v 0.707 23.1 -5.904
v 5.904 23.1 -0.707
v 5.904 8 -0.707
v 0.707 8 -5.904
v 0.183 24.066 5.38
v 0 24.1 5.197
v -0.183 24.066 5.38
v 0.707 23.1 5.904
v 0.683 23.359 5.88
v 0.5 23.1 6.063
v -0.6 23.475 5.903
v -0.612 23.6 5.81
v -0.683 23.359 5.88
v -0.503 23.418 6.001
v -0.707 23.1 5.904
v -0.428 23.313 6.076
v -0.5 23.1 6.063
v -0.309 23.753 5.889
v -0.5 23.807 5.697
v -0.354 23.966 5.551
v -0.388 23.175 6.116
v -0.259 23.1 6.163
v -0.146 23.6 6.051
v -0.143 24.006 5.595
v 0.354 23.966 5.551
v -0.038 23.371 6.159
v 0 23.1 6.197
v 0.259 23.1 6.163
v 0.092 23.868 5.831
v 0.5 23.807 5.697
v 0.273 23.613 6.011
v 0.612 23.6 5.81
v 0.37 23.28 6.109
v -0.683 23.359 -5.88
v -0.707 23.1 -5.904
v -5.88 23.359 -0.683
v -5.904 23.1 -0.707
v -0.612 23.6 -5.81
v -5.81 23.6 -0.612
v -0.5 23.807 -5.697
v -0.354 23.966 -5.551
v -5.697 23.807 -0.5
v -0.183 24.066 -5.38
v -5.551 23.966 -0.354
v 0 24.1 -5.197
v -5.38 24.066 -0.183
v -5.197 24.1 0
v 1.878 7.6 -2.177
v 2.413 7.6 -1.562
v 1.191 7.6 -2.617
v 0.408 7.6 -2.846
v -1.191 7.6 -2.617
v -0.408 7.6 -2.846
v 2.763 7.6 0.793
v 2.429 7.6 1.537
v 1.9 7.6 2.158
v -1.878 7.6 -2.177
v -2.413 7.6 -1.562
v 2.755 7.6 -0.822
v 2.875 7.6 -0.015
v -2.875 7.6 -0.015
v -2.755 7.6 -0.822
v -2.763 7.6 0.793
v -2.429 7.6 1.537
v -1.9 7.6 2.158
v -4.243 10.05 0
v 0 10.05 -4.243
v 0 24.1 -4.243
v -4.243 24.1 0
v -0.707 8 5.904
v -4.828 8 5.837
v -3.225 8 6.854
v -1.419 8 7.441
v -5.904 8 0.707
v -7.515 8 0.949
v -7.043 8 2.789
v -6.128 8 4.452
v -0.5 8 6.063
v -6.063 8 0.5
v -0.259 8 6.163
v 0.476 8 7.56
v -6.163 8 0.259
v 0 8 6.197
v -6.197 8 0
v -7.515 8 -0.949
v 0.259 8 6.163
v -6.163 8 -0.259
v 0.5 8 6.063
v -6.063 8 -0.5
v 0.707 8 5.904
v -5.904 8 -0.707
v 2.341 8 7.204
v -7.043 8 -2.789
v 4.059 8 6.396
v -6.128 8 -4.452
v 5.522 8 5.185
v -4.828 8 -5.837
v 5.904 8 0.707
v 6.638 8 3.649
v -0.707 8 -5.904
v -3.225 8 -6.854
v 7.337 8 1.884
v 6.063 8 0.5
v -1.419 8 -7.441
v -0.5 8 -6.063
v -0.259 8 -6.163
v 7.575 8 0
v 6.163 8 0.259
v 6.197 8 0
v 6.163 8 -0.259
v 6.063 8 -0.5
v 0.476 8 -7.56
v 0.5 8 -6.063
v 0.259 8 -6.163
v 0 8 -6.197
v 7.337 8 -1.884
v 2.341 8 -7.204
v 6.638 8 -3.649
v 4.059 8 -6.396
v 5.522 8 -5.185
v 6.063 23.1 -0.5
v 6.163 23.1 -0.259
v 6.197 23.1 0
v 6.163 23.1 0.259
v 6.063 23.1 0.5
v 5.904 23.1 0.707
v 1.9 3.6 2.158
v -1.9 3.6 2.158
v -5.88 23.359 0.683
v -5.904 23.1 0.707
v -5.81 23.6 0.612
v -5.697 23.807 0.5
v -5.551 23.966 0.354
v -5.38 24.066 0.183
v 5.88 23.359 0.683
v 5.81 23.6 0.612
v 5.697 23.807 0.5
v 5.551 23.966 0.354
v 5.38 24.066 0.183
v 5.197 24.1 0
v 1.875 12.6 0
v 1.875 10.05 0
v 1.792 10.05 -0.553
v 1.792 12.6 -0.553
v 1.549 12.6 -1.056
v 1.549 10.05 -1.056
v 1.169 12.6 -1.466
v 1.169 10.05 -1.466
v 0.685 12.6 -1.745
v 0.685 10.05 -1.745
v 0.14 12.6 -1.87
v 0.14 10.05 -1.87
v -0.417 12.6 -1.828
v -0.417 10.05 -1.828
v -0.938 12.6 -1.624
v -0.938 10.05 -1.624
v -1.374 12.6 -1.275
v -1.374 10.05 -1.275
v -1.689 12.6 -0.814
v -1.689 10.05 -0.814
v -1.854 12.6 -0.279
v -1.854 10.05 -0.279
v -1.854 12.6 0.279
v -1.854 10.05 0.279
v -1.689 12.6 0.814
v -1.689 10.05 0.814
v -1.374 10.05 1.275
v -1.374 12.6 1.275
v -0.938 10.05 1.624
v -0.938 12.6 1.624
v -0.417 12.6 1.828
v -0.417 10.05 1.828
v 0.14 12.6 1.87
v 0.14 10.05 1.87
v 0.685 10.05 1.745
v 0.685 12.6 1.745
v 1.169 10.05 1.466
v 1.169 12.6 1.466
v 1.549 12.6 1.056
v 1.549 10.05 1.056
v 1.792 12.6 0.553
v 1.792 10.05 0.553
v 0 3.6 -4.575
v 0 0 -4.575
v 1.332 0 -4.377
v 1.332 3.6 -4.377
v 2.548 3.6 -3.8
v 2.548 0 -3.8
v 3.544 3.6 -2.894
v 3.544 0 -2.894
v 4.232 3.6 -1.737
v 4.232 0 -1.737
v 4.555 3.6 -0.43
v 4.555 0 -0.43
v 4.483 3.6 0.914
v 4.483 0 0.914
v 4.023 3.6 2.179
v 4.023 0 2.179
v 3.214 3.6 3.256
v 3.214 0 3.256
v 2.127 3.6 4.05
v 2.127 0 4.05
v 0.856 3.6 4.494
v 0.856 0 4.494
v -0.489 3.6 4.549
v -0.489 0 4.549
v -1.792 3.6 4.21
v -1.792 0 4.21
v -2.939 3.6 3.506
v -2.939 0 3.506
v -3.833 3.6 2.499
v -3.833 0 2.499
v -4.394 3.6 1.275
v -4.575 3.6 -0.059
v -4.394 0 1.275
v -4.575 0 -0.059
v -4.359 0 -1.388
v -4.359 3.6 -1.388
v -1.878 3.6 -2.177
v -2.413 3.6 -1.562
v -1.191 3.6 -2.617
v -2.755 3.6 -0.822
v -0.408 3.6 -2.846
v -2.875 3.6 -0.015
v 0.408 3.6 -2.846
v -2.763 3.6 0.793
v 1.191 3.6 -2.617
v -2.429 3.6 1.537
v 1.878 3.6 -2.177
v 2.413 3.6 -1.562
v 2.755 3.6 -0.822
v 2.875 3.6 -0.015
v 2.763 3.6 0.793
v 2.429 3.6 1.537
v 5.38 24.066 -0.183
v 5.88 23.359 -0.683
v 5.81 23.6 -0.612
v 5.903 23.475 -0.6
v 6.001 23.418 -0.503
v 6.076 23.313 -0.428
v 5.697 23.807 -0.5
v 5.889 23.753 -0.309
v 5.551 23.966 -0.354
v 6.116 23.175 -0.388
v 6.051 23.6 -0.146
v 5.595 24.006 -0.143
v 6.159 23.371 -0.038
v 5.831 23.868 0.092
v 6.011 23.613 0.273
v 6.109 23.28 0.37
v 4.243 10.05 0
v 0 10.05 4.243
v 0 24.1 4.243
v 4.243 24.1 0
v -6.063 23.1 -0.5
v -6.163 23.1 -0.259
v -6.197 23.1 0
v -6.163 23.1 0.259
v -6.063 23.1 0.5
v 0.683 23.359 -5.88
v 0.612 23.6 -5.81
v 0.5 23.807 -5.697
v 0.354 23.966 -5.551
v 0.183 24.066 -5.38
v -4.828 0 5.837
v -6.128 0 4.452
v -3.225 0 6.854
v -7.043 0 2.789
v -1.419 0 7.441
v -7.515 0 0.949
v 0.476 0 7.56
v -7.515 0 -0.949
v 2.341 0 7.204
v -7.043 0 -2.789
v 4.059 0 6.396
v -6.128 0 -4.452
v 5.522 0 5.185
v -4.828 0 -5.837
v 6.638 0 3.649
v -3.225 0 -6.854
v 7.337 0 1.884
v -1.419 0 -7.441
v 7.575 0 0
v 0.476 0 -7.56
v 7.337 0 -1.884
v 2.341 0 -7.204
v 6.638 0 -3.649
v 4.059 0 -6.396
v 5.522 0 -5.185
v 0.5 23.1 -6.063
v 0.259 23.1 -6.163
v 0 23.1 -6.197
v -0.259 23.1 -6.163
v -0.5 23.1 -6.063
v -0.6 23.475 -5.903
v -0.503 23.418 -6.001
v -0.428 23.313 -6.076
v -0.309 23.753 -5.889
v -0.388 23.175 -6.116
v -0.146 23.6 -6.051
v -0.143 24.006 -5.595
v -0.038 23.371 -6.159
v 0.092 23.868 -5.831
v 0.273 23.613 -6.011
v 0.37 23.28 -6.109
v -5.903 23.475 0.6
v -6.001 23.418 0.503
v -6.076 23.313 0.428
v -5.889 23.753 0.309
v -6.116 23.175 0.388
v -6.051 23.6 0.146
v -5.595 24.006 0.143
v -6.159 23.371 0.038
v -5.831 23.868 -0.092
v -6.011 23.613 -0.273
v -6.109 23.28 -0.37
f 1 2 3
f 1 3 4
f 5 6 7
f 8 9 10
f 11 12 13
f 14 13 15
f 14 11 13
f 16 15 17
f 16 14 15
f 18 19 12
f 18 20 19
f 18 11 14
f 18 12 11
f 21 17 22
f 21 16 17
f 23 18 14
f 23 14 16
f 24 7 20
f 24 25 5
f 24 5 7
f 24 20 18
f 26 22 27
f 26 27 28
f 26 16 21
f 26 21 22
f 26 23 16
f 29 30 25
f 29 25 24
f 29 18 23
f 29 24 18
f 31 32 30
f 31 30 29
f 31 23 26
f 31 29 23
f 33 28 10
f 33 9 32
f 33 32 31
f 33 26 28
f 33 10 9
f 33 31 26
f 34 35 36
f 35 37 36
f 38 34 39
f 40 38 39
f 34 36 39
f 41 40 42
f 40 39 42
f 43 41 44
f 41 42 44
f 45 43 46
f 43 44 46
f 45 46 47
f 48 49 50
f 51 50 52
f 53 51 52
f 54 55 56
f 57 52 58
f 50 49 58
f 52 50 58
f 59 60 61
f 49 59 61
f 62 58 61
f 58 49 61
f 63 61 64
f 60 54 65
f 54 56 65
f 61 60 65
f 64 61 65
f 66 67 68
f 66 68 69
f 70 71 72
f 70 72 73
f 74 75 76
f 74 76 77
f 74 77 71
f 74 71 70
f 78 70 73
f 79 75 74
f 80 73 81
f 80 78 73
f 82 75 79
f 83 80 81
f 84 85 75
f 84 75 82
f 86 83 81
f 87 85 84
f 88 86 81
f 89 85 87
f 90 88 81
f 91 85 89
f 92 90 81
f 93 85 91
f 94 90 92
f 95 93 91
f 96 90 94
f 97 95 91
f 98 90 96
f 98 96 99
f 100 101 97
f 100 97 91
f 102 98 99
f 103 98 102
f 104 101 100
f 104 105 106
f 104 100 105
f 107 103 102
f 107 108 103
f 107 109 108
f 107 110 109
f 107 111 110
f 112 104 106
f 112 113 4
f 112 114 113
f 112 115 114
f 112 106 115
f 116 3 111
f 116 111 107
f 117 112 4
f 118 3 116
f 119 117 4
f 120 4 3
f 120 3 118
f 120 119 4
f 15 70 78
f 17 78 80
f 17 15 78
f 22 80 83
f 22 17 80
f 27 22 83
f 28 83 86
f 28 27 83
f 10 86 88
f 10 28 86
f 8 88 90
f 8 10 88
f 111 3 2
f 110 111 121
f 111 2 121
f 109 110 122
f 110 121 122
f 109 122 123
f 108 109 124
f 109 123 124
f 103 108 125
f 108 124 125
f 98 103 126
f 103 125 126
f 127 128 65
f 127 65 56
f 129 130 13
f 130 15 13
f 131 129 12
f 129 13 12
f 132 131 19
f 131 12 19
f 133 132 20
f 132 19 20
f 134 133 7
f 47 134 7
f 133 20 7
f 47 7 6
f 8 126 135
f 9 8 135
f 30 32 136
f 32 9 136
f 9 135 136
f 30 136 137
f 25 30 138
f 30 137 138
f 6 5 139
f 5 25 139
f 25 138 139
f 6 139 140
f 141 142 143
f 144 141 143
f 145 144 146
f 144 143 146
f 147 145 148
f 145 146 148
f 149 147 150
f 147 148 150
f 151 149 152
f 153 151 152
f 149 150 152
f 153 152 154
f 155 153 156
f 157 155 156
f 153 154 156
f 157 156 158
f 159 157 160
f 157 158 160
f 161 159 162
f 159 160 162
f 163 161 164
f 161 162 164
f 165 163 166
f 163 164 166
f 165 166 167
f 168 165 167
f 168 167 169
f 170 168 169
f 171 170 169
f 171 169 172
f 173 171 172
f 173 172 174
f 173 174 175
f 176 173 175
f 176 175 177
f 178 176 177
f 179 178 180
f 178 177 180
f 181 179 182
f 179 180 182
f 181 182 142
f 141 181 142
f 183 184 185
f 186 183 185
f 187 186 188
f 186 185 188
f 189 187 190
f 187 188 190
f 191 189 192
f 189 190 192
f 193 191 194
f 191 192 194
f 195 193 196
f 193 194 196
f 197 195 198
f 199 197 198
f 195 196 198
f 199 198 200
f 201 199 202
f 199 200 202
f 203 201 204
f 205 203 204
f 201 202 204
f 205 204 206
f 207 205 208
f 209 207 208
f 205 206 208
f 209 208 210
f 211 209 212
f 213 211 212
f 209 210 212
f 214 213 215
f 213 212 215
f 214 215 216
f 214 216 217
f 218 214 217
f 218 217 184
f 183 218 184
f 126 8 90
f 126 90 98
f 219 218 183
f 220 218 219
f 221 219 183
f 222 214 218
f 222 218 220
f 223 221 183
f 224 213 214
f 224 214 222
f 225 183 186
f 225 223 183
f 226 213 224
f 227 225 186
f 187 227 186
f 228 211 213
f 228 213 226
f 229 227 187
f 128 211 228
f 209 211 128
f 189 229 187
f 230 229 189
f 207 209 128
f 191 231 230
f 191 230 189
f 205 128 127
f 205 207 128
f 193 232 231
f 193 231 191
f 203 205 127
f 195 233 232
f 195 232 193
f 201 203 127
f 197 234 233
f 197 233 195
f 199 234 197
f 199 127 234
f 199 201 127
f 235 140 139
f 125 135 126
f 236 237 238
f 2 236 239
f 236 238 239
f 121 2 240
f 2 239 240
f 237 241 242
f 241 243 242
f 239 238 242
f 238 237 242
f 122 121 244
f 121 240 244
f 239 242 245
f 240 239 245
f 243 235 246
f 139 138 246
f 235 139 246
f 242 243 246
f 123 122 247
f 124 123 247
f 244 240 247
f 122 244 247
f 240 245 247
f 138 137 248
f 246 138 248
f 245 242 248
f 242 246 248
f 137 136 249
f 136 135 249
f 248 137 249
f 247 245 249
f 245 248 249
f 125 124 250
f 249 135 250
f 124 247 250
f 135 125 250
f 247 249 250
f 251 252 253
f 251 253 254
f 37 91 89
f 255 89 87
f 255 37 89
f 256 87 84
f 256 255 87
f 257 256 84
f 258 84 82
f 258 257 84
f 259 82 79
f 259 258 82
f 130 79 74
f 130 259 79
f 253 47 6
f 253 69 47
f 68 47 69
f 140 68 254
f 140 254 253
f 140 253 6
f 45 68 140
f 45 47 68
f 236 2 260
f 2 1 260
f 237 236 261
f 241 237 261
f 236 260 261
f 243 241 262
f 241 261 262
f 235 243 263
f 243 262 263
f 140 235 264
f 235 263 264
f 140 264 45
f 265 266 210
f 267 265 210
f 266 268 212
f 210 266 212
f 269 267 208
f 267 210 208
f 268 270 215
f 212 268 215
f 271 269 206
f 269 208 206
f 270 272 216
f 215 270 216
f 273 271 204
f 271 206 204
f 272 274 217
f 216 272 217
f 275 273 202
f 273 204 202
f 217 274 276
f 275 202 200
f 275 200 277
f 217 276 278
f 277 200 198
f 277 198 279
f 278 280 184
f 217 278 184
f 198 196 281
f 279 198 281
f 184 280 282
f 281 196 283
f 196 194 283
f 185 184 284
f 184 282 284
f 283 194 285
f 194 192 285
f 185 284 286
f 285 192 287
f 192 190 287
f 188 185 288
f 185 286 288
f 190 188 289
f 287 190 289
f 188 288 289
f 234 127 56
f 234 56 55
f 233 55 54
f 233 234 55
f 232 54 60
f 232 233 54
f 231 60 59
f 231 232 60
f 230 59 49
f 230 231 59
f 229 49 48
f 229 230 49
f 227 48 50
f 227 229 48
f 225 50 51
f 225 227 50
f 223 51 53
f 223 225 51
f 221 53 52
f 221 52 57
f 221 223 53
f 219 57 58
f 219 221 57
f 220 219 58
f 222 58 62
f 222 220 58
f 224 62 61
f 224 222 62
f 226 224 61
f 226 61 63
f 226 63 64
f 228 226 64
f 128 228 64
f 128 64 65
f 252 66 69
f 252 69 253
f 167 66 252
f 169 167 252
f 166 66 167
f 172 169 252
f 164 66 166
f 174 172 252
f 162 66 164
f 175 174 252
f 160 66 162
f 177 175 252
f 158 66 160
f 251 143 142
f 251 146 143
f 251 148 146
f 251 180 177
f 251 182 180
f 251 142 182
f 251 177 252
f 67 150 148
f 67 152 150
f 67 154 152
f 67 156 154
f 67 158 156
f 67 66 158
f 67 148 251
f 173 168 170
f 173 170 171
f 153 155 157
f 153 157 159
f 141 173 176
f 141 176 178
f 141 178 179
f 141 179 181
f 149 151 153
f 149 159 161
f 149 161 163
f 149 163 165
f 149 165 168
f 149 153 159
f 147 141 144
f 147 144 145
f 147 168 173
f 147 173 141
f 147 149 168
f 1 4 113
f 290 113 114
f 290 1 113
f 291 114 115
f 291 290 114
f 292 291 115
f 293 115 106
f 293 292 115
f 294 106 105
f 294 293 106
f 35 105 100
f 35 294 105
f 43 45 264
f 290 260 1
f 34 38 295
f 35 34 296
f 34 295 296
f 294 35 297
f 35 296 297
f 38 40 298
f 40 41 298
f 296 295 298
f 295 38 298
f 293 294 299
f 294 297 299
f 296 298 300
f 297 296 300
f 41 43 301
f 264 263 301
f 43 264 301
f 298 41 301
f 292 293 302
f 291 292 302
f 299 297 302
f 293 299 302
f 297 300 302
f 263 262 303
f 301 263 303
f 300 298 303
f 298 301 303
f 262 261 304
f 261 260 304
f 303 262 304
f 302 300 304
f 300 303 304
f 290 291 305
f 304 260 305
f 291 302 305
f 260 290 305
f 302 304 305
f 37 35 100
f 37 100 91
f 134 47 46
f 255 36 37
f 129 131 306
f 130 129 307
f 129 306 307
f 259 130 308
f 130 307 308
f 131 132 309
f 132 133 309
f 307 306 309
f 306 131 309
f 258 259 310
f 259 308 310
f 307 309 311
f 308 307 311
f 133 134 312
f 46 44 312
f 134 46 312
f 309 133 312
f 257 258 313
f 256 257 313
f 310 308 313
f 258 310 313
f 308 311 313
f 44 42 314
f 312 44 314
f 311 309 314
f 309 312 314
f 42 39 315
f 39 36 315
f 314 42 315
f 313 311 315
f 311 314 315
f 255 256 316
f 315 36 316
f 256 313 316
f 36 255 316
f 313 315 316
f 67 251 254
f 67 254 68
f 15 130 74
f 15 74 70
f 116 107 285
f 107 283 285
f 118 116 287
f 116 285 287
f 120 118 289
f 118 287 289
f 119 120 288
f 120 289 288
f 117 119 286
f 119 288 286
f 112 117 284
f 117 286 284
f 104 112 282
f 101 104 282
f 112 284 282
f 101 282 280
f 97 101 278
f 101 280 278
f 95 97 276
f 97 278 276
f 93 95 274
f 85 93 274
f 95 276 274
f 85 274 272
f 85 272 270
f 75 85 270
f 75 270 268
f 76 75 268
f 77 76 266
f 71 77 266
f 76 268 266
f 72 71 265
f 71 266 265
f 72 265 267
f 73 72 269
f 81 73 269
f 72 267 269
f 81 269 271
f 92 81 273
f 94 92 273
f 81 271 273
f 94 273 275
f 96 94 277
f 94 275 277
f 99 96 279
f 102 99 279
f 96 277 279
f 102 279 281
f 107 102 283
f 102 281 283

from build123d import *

# Parameters (mm, degrees)
SKETCH1_R           = 7.575
BOSS_EXTRUDE1_DEPTH = 5.2
CUT_EXTRUDE1_DEPTH  = 3.6
BOSS_EXTRUDE2_DEPTH = 18.9
FILLET1_R           = 1
BOSS_EXTRUDE3_DEPTH = 4.85
SKETCH6_R           = 1.875
BOSS_EXTRUDE4_DEPTH = 2.55
CUT_EXTRUDE2_DEPTH  = 4
SKETCH7_R           = 7.575
BOSS_EXTRUDE5_DEPTH = 2.8


with BuildPart() as part:
    # Sketch1 → Boss-Extrude1 (new body)
    with BuildSketch(Plane(origin=(0, 0, 0), x_dir=(1, 0, 0), z_dir=(0, 1, 0))):
        Circle(SKETCH1_R)
    extrude(amount=BOSS_EXTRUDE1_DEPTH)

    # Sketch2 → Cut-Extrude1 (cut)
    with BuildSketch(Plane.XZ):
        with BuildLine():
            Line((-4.359330502, -1.388114754), (0, -4.575))
            ThreePointArc((0, -4.575), (2.7, 3.693321676), (-4.359330502, -1.388114754))
        make_face()
    extrude(amount=-CUT_EXTRUDE1_DEPTH, mode=Mode.SUBTRACT)

    # Sketch4 → Boss-Extrude2 (add)
    with BuildSketch(Plane(origin=(0, 5.2, 0), x_dir=(1, 0, 0), z_dir=(0, 1, 0))):
        Polygon((6.611448404, 0), (0, 6.611448404), (-6.611448404, 0), (0, -6.611448404), align=None)
        Polygon((4.242640687, 0), (0, 4.242640687), (-4.242640687, 0), (0, -4.242640687), align=None, mode=Mode.SUBTRACT)
    extrude(amount=BOSS_EXTRUDE2_DEPTH)

    # Fillet1
    fillet1_edges = [part.edges().sort_by_distance(p)[0] for p in [
        (3.305724202, 24.1, 3.305724202),
        (3.305724202, 24.1, -3.305724202),
        (-3.305724202, 24.1, -3.305724202),
        (-3.305724202, 24.1, 3.305724202),
        (0, 14.65, 6.611448404),
        (6.611448404, 14.65, 0),
        (0, 14.65, -6.611448404),
        (-6.611448404, 14.65, 0),
    ]]
    fillet(fillet1_edges, radius=FILLET1_R)

    # Sketch5 → Boss-Extrude3 (add)
    with BuildSketch(Plane(origin=(0, 5.2, 0), x_dir=(1, 0, 0), z_dir=(0, 1, 0))):
        Polygon((0, -4.242640687), (4.242640687, 0), (0, 4.242640687), (-4.242640687, 0), align=None)
    extrude(amount=BOSS_EXTRUDE3_DEPTH)

    # Sketch6 → Boss-Extrude4 (add)
    with BuildSketch(Plane(origin=(0, 10.05, 0), x_dir=(1, 0, 0), z_dir=(0, 1, 0))):
        Circle(SKETCH6_R)
    extrude(amount=BOSS_EXTRUDE4_DEPTH)

    # Sketch3 → Cut-Extrude2 (cut)
    with BuildSketch(Plane.XZ.offset(-3.6)):
        with BuildLine():
            Line((-1.9, 2.157689737), (1.9, 2.157689737))
            ThreePointArc((1.9, 2.157689737), (0, -2.875), (-1.9, 2.157689737))
        make_face()
    extrude(amount=-CUT_EXTRUDE2_DEPTH, mode=Mode.SUBTRACT)

    # Sketch7 → Boss-Extrude5 (add)
    with BuildSketch(Plane(origin=(0, 5.2, 0), x_dir=(1, 0, 0), z_dir=(0, 1, 0))):
        Circle(SKETCH7_R)
        with BuildLine():
            Line((-5.904341623, -0.707106781), (-0.707106781, -5.904341623))
            ThreePointArc((-0.707106781, -5.904341623), (0, -6.197234842), (0.707106781, -5.904341623))
            Line((0.707106781, -5.904341623), (5.904341623, -0.707106781))
            ThreePointArc((5.904341623, -0.707106781), (6.197234842, 0), (5.904341623, 0.707106781))
            Line((5.904341623, 0.707106781), (0.707106781, 5.904341623))
            ThreePointArc((0.707106781, 5.904341623), (0, 6.197234842), (-0.707106781, 5.904341623))
            Line((-0.707106781, 5.904341623), (-5.904341623, 0.707106781))
            ThreePointArc((-5.904341623, 0.707106781), (-6.197234842, 0), (-5.904341623, -0.707106781))
        make_face(mode=Mode.SUBTRACT)
    extrude(amount=BOSS_EXTRUDE5_DEPTH)


solid = part.part
